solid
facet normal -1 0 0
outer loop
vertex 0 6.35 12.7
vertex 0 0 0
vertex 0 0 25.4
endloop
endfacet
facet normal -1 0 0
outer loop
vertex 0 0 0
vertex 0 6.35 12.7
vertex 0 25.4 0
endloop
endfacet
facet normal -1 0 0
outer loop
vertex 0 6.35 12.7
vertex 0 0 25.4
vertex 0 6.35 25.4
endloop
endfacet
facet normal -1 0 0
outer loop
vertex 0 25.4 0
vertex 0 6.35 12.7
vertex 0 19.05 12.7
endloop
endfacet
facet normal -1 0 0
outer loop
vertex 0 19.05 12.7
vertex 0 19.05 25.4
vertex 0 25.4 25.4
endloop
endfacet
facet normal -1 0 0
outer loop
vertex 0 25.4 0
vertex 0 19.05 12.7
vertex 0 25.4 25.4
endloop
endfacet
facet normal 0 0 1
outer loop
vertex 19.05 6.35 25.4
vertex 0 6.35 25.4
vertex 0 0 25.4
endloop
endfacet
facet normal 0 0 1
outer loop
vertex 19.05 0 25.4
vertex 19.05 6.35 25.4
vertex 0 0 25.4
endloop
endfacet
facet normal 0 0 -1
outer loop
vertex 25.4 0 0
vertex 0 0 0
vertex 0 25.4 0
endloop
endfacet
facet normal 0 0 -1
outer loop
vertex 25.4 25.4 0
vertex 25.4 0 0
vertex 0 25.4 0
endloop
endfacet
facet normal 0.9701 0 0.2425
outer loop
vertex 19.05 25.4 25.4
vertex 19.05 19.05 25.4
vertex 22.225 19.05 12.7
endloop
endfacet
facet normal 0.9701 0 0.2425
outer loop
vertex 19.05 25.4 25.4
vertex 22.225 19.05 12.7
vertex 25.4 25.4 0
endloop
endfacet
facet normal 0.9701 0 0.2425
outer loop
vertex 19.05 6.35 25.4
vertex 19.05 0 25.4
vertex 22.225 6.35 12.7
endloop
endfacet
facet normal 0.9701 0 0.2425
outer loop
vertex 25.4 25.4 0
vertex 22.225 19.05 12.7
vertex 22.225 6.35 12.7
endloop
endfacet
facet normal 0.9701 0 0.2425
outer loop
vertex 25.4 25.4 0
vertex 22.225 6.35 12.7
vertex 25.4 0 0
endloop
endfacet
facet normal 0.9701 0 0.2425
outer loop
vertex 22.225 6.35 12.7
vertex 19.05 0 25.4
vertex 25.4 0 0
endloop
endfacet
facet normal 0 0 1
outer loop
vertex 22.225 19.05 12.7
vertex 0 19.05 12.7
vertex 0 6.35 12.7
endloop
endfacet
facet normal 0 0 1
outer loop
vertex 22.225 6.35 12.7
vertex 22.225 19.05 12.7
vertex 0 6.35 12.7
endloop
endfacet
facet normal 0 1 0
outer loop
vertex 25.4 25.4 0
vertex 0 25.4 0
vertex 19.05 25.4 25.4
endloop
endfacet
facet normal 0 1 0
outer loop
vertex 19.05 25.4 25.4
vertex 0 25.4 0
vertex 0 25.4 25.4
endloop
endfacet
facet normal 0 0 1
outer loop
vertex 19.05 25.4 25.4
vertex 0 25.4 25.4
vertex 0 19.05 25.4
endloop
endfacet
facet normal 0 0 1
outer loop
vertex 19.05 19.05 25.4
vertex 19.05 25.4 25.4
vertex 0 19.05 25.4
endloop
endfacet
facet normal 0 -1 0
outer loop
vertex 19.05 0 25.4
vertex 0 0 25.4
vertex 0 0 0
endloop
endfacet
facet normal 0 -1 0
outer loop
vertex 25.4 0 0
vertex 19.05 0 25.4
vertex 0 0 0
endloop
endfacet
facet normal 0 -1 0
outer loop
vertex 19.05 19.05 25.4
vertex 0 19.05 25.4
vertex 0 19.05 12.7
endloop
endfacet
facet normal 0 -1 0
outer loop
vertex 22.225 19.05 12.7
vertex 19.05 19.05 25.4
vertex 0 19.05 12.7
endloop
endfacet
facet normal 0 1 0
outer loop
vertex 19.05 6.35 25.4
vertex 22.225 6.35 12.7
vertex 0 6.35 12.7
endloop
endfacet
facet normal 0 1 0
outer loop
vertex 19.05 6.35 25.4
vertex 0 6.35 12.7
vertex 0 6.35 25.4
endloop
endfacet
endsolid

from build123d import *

# Parameters (mm, degrees)
F1_DEPTH = 25.4
F3_DEPTH = 25.4


with BuildPart() as f1:
    # F0 (on Right) → F1 (new body)
    with BuildSketch(Plane.YZ):
        Polygon((0, 25.4), (0, 0), (25.4, 0), (25.4, 25.4), (19.05, 25.4), (19.05, 12.7), (6.35, 12.7), (6.35, 25.4), align=None)
    extrude(amount=F1_DEPTH)

    # F2 (on face) → F3 (cut)
    with BuildSketch(Plane.XZ):
        Polygon((25.4, 25.4), (19.05, 25.4), (25.4, 0), align=None)
    extrude(amount=-F3_DEPTH, mode=Mode.SUBTRACT)


solid = f1.part
